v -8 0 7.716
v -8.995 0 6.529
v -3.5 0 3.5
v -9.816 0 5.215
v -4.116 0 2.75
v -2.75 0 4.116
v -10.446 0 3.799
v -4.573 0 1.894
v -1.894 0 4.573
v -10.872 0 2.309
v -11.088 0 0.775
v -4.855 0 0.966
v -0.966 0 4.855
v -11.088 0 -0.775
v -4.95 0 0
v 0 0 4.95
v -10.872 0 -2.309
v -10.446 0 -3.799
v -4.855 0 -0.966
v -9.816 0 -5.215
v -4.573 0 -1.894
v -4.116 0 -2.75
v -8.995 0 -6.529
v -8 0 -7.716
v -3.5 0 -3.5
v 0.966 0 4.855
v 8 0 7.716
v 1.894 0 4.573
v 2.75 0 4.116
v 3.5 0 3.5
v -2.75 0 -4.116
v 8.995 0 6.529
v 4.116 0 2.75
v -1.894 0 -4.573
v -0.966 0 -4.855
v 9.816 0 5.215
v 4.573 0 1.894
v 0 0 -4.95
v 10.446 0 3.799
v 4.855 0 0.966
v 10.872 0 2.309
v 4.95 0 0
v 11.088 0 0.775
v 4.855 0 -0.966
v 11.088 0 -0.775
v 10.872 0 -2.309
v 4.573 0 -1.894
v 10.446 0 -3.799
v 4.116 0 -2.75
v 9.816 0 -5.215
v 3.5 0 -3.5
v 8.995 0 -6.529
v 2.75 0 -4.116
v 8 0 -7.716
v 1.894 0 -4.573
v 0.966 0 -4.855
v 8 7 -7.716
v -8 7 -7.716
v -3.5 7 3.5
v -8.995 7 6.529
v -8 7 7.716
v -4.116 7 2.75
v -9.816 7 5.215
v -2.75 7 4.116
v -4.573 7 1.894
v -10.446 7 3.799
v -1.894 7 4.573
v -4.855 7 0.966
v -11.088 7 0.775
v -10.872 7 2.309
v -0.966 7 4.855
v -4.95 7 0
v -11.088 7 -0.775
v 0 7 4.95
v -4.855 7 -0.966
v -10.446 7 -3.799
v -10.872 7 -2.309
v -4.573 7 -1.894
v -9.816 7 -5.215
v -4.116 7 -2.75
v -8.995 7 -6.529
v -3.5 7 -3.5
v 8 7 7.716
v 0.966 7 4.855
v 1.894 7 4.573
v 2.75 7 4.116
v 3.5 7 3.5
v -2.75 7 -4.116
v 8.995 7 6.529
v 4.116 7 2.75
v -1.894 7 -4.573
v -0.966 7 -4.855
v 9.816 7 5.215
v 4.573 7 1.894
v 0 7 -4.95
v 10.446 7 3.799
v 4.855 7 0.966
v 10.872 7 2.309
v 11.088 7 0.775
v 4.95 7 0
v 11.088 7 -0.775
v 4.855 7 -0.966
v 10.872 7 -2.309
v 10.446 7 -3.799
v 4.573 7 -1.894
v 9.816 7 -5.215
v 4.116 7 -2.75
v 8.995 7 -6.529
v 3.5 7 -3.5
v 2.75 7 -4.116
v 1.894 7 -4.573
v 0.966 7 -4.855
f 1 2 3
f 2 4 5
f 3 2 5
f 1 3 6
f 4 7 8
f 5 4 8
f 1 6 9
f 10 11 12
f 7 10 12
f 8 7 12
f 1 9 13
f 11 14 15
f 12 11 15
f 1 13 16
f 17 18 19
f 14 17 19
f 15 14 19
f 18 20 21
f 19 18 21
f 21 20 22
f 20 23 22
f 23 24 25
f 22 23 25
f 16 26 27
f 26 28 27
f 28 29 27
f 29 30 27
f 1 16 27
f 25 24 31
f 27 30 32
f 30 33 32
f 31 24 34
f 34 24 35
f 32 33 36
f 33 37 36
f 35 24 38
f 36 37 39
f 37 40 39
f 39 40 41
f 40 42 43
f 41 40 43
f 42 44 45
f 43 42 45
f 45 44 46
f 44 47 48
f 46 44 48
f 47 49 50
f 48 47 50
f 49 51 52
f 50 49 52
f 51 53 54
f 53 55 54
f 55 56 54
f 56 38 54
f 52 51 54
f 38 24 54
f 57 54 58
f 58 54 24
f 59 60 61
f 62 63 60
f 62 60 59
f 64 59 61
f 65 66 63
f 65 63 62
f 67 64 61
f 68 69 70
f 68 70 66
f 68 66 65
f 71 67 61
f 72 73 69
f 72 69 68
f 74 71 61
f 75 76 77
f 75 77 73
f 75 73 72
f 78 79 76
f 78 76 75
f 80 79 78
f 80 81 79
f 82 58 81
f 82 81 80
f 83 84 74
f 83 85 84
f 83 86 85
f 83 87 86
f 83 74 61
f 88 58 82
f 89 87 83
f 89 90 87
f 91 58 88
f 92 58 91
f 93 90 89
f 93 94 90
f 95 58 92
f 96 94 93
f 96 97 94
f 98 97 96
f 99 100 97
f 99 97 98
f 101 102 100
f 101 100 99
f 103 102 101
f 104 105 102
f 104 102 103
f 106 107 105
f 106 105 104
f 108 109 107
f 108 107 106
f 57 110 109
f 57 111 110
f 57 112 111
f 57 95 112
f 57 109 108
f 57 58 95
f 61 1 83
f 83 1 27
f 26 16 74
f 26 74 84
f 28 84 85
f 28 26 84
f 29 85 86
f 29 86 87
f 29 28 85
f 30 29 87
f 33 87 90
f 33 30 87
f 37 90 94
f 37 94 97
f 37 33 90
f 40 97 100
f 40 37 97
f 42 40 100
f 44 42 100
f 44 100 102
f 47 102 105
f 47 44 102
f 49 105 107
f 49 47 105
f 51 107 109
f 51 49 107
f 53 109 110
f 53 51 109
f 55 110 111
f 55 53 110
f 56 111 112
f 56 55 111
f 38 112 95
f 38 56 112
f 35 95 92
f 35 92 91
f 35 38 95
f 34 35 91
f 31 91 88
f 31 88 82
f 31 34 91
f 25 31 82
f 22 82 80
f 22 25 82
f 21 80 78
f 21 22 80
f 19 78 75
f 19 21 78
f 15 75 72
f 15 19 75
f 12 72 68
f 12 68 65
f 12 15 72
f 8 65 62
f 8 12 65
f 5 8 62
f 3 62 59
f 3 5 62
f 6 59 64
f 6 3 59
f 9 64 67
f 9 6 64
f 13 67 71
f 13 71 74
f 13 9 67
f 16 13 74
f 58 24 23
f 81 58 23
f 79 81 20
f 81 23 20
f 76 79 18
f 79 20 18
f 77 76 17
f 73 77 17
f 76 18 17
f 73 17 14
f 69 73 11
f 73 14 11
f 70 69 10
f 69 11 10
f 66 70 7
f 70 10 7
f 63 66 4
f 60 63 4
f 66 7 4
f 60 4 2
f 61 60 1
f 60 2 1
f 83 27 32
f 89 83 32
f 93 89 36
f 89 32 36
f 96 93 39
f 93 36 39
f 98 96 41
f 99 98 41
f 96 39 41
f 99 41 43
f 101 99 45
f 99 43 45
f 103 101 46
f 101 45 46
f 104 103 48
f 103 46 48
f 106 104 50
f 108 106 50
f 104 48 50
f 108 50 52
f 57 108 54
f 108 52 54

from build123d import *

# Parameters (mm, degrees)
SKETCH1_R           = 4.95
BOSS_EXTRUDE2_DEPTH = 7


with BuildPart() as part:
    # Sketch1 → Boss-Extrude2 (new body)
    with BuildSketch(Plane(origin=(0, 0, 0), x_dir=(1, 0, 0), z_dir=(0, 1, 0))):
        with BuildLine():
            ThreePointArc((-8, 7.716425662), (-11.115, 0), (-8, -7.716425662))
            Line((-8, -7.716425662), (8, -7.716425662))
            ThreePointArc((8, -7.716425662), (11.115, 0), (8, 7.716425662))
            Line((8, 7.716425662), (-8, 7.716425662))
        make_face()
        with Locations(Location((0, 0, 0), (0, 0, 270))):
            Circle(SKETCH1_R, mode=Mode.SUBTRACT)
    extrude(amount=BOSS_EXTRUDE2_DEPTH)


solid = part.part
